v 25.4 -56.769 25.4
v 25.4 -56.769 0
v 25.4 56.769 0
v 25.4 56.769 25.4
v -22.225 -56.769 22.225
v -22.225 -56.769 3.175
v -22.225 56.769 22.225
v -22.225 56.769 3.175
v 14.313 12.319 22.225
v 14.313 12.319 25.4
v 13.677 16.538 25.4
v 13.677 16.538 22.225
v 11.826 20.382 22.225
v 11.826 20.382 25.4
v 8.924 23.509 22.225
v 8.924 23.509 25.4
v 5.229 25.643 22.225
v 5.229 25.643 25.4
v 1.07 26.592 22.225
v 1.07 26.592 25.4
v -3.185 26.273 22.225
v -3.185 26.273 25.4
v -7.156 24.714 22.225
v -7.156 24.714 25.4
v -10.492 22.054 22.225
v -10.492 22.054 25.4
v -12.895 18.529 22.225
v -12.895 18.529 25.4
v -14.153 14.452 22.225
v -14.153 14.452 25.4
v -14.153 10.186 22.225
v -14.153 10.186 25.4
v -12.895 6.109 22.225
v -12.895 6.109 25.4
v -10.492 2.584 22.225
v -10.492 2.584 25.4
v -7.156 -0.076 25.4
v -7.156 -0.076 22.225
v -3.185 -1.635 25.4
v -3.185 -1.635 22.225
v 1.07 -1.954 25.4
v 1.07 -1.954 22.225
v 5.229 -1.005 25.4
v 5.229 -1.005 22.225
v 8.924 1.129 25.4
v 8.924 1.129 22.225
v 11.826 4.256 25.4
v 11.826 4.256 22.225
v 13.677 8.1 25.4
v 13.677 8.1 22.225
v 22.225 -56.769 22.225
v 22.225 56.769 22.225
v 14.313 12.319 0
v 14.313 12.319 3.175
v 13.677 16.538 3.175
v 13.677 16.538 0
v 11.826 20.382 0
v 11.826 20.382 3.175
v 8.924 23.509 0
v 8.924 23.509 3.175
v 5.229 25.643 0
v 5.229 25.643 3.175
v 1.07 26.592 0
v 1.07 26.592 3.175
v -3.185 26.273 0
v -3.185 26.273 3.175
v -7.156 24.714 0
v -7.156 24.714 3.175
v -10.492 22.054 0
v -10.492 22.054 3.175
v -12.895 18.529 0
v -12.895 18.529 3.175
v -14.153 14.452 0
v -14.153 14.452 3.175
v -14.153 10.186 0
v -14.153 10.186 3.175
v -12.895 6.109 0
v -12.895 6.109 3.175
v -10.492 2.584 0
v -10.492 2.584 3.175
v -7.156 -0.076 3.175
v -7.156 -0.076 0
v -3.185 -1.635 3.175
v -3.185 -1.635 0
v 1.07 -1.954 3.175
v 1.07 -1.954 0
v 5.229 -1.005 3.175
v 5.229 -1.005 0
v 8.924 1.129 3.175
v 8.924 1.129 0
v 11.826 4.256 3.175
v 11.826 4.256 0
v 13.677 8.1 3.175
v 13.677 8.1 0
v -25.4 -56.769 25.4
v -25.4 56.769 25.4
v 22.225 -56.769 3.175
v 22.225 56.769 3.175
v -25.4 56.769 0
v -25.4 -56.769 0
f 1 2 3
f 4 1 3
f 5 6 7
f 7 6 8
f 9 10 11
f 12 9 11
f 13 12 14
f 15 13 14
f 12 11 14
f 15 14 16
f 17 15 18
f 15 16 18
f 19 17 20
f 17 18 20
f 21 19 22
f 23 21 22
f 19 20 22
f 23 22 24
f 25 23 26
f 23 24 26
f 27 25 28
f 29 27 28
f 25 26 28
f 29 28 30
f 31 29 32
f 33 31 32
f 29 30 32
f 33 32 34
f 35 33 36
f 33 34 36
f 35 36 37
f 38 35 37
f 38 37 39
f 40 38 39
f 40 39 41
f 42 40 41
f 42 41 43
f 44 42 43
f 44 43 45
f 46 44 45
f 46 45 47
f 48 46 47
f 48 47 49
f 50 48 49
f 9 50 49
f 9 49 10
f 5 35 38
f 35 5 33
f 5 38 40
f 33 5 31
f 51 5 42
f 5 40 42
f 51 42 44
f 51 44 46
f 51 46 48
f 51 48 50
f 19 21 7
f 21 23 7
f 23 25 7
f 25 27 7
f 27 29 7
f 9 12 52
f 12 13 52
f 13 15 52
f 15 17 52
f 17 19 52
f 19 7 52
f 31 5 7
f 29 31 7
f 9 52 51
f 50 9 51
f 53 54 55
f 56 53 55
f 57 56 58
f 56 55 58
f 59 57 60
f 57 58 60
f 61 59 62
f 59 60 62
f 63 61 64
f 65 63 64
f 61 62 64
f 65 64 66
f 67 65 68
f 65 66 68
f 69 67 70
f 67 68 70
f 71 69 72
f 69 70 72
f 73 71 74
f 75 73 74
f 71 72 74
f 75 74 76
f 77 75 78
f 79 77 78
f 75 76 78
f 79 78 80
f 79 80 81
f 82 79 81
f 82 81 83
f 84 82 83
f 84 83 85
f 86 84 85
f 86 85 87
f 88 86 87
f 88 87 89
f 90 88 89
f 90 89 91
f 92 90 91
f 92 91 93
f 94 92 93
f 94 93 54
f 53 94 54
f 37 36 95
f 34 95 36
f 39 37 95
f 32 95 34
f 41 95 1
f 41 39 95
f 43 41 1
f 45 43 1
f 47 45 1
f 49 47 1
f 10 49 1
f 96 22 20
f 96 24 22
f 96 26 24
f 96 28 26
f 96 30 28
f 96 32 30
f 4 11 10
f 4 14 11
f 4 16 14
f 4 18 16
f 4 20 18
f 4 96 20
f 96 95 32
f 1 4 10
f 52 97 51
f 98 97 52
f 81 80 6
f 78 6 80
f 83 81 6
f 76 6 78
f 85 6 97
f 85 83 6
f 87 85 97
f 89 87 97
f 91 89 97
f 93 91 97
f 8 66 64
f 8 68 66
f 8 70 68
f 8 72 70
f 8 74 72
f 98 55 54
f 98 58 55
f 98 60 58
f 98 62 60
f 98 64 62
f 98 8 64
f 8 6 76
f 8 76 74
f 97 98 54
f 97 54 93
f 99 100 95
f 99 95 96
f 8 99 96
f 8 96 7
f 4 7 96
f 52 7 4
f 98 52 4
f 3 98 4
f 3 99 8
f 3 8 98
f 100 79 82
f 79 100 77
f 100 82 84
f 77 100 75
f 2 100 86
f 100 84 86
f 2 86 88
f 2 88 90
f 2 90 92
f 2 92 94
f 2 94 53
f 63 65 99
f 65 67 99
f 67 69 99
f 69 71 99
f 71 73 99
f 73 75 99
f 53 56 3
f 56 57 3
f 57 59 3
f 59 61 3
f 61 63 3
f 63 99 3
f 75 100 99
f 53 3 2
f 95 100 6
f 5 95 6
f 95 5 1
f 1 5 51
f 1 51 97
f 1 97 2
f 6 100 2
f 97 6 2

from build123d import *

# Parameters (mm, degrees)
SKETCH1_W           = 50.8
SKETCH1_H           = 113.538
BOSS_EXTRUDE1_DEPTH = 25.4
SHELL1_T            = -3.175
SKETCH2_R           = 14.3129
CUT_EXTRUDE1_DEPTH  = 25.4


with BuildPart() as part:
    # Sketch1 → Boss-Extrude1 (new body)
    with BuildSketch(Plane.XY):
        Rectangle(SKETCH1_W, SKETCH1_H)
    extrude(amount=BOSS_EXTRUDE1_DEPTH)

    # Shell1
    shell1_openings = [part.faces().sort_by_distance(p)[0] for p in [
        (0, -56.769, 12.7),
        (0, 56.769, 12.7),
    ]]
    offset(amount=SHELL1_T, openings=shell1_openings, kind=Kind.INTERSECTION)

    # Sketch2 → Cut-Extrude1 (cut)
    with BuildSketch(Plane.XY.offset(25.4)):
        with Locations((0, 12.319)):
            Circle(SKETCH2_R)
    extrude(amount=-CUT_EXTRUDE1_DEPTH, mode=Mode.SUBTRACT)


solid = part.part
